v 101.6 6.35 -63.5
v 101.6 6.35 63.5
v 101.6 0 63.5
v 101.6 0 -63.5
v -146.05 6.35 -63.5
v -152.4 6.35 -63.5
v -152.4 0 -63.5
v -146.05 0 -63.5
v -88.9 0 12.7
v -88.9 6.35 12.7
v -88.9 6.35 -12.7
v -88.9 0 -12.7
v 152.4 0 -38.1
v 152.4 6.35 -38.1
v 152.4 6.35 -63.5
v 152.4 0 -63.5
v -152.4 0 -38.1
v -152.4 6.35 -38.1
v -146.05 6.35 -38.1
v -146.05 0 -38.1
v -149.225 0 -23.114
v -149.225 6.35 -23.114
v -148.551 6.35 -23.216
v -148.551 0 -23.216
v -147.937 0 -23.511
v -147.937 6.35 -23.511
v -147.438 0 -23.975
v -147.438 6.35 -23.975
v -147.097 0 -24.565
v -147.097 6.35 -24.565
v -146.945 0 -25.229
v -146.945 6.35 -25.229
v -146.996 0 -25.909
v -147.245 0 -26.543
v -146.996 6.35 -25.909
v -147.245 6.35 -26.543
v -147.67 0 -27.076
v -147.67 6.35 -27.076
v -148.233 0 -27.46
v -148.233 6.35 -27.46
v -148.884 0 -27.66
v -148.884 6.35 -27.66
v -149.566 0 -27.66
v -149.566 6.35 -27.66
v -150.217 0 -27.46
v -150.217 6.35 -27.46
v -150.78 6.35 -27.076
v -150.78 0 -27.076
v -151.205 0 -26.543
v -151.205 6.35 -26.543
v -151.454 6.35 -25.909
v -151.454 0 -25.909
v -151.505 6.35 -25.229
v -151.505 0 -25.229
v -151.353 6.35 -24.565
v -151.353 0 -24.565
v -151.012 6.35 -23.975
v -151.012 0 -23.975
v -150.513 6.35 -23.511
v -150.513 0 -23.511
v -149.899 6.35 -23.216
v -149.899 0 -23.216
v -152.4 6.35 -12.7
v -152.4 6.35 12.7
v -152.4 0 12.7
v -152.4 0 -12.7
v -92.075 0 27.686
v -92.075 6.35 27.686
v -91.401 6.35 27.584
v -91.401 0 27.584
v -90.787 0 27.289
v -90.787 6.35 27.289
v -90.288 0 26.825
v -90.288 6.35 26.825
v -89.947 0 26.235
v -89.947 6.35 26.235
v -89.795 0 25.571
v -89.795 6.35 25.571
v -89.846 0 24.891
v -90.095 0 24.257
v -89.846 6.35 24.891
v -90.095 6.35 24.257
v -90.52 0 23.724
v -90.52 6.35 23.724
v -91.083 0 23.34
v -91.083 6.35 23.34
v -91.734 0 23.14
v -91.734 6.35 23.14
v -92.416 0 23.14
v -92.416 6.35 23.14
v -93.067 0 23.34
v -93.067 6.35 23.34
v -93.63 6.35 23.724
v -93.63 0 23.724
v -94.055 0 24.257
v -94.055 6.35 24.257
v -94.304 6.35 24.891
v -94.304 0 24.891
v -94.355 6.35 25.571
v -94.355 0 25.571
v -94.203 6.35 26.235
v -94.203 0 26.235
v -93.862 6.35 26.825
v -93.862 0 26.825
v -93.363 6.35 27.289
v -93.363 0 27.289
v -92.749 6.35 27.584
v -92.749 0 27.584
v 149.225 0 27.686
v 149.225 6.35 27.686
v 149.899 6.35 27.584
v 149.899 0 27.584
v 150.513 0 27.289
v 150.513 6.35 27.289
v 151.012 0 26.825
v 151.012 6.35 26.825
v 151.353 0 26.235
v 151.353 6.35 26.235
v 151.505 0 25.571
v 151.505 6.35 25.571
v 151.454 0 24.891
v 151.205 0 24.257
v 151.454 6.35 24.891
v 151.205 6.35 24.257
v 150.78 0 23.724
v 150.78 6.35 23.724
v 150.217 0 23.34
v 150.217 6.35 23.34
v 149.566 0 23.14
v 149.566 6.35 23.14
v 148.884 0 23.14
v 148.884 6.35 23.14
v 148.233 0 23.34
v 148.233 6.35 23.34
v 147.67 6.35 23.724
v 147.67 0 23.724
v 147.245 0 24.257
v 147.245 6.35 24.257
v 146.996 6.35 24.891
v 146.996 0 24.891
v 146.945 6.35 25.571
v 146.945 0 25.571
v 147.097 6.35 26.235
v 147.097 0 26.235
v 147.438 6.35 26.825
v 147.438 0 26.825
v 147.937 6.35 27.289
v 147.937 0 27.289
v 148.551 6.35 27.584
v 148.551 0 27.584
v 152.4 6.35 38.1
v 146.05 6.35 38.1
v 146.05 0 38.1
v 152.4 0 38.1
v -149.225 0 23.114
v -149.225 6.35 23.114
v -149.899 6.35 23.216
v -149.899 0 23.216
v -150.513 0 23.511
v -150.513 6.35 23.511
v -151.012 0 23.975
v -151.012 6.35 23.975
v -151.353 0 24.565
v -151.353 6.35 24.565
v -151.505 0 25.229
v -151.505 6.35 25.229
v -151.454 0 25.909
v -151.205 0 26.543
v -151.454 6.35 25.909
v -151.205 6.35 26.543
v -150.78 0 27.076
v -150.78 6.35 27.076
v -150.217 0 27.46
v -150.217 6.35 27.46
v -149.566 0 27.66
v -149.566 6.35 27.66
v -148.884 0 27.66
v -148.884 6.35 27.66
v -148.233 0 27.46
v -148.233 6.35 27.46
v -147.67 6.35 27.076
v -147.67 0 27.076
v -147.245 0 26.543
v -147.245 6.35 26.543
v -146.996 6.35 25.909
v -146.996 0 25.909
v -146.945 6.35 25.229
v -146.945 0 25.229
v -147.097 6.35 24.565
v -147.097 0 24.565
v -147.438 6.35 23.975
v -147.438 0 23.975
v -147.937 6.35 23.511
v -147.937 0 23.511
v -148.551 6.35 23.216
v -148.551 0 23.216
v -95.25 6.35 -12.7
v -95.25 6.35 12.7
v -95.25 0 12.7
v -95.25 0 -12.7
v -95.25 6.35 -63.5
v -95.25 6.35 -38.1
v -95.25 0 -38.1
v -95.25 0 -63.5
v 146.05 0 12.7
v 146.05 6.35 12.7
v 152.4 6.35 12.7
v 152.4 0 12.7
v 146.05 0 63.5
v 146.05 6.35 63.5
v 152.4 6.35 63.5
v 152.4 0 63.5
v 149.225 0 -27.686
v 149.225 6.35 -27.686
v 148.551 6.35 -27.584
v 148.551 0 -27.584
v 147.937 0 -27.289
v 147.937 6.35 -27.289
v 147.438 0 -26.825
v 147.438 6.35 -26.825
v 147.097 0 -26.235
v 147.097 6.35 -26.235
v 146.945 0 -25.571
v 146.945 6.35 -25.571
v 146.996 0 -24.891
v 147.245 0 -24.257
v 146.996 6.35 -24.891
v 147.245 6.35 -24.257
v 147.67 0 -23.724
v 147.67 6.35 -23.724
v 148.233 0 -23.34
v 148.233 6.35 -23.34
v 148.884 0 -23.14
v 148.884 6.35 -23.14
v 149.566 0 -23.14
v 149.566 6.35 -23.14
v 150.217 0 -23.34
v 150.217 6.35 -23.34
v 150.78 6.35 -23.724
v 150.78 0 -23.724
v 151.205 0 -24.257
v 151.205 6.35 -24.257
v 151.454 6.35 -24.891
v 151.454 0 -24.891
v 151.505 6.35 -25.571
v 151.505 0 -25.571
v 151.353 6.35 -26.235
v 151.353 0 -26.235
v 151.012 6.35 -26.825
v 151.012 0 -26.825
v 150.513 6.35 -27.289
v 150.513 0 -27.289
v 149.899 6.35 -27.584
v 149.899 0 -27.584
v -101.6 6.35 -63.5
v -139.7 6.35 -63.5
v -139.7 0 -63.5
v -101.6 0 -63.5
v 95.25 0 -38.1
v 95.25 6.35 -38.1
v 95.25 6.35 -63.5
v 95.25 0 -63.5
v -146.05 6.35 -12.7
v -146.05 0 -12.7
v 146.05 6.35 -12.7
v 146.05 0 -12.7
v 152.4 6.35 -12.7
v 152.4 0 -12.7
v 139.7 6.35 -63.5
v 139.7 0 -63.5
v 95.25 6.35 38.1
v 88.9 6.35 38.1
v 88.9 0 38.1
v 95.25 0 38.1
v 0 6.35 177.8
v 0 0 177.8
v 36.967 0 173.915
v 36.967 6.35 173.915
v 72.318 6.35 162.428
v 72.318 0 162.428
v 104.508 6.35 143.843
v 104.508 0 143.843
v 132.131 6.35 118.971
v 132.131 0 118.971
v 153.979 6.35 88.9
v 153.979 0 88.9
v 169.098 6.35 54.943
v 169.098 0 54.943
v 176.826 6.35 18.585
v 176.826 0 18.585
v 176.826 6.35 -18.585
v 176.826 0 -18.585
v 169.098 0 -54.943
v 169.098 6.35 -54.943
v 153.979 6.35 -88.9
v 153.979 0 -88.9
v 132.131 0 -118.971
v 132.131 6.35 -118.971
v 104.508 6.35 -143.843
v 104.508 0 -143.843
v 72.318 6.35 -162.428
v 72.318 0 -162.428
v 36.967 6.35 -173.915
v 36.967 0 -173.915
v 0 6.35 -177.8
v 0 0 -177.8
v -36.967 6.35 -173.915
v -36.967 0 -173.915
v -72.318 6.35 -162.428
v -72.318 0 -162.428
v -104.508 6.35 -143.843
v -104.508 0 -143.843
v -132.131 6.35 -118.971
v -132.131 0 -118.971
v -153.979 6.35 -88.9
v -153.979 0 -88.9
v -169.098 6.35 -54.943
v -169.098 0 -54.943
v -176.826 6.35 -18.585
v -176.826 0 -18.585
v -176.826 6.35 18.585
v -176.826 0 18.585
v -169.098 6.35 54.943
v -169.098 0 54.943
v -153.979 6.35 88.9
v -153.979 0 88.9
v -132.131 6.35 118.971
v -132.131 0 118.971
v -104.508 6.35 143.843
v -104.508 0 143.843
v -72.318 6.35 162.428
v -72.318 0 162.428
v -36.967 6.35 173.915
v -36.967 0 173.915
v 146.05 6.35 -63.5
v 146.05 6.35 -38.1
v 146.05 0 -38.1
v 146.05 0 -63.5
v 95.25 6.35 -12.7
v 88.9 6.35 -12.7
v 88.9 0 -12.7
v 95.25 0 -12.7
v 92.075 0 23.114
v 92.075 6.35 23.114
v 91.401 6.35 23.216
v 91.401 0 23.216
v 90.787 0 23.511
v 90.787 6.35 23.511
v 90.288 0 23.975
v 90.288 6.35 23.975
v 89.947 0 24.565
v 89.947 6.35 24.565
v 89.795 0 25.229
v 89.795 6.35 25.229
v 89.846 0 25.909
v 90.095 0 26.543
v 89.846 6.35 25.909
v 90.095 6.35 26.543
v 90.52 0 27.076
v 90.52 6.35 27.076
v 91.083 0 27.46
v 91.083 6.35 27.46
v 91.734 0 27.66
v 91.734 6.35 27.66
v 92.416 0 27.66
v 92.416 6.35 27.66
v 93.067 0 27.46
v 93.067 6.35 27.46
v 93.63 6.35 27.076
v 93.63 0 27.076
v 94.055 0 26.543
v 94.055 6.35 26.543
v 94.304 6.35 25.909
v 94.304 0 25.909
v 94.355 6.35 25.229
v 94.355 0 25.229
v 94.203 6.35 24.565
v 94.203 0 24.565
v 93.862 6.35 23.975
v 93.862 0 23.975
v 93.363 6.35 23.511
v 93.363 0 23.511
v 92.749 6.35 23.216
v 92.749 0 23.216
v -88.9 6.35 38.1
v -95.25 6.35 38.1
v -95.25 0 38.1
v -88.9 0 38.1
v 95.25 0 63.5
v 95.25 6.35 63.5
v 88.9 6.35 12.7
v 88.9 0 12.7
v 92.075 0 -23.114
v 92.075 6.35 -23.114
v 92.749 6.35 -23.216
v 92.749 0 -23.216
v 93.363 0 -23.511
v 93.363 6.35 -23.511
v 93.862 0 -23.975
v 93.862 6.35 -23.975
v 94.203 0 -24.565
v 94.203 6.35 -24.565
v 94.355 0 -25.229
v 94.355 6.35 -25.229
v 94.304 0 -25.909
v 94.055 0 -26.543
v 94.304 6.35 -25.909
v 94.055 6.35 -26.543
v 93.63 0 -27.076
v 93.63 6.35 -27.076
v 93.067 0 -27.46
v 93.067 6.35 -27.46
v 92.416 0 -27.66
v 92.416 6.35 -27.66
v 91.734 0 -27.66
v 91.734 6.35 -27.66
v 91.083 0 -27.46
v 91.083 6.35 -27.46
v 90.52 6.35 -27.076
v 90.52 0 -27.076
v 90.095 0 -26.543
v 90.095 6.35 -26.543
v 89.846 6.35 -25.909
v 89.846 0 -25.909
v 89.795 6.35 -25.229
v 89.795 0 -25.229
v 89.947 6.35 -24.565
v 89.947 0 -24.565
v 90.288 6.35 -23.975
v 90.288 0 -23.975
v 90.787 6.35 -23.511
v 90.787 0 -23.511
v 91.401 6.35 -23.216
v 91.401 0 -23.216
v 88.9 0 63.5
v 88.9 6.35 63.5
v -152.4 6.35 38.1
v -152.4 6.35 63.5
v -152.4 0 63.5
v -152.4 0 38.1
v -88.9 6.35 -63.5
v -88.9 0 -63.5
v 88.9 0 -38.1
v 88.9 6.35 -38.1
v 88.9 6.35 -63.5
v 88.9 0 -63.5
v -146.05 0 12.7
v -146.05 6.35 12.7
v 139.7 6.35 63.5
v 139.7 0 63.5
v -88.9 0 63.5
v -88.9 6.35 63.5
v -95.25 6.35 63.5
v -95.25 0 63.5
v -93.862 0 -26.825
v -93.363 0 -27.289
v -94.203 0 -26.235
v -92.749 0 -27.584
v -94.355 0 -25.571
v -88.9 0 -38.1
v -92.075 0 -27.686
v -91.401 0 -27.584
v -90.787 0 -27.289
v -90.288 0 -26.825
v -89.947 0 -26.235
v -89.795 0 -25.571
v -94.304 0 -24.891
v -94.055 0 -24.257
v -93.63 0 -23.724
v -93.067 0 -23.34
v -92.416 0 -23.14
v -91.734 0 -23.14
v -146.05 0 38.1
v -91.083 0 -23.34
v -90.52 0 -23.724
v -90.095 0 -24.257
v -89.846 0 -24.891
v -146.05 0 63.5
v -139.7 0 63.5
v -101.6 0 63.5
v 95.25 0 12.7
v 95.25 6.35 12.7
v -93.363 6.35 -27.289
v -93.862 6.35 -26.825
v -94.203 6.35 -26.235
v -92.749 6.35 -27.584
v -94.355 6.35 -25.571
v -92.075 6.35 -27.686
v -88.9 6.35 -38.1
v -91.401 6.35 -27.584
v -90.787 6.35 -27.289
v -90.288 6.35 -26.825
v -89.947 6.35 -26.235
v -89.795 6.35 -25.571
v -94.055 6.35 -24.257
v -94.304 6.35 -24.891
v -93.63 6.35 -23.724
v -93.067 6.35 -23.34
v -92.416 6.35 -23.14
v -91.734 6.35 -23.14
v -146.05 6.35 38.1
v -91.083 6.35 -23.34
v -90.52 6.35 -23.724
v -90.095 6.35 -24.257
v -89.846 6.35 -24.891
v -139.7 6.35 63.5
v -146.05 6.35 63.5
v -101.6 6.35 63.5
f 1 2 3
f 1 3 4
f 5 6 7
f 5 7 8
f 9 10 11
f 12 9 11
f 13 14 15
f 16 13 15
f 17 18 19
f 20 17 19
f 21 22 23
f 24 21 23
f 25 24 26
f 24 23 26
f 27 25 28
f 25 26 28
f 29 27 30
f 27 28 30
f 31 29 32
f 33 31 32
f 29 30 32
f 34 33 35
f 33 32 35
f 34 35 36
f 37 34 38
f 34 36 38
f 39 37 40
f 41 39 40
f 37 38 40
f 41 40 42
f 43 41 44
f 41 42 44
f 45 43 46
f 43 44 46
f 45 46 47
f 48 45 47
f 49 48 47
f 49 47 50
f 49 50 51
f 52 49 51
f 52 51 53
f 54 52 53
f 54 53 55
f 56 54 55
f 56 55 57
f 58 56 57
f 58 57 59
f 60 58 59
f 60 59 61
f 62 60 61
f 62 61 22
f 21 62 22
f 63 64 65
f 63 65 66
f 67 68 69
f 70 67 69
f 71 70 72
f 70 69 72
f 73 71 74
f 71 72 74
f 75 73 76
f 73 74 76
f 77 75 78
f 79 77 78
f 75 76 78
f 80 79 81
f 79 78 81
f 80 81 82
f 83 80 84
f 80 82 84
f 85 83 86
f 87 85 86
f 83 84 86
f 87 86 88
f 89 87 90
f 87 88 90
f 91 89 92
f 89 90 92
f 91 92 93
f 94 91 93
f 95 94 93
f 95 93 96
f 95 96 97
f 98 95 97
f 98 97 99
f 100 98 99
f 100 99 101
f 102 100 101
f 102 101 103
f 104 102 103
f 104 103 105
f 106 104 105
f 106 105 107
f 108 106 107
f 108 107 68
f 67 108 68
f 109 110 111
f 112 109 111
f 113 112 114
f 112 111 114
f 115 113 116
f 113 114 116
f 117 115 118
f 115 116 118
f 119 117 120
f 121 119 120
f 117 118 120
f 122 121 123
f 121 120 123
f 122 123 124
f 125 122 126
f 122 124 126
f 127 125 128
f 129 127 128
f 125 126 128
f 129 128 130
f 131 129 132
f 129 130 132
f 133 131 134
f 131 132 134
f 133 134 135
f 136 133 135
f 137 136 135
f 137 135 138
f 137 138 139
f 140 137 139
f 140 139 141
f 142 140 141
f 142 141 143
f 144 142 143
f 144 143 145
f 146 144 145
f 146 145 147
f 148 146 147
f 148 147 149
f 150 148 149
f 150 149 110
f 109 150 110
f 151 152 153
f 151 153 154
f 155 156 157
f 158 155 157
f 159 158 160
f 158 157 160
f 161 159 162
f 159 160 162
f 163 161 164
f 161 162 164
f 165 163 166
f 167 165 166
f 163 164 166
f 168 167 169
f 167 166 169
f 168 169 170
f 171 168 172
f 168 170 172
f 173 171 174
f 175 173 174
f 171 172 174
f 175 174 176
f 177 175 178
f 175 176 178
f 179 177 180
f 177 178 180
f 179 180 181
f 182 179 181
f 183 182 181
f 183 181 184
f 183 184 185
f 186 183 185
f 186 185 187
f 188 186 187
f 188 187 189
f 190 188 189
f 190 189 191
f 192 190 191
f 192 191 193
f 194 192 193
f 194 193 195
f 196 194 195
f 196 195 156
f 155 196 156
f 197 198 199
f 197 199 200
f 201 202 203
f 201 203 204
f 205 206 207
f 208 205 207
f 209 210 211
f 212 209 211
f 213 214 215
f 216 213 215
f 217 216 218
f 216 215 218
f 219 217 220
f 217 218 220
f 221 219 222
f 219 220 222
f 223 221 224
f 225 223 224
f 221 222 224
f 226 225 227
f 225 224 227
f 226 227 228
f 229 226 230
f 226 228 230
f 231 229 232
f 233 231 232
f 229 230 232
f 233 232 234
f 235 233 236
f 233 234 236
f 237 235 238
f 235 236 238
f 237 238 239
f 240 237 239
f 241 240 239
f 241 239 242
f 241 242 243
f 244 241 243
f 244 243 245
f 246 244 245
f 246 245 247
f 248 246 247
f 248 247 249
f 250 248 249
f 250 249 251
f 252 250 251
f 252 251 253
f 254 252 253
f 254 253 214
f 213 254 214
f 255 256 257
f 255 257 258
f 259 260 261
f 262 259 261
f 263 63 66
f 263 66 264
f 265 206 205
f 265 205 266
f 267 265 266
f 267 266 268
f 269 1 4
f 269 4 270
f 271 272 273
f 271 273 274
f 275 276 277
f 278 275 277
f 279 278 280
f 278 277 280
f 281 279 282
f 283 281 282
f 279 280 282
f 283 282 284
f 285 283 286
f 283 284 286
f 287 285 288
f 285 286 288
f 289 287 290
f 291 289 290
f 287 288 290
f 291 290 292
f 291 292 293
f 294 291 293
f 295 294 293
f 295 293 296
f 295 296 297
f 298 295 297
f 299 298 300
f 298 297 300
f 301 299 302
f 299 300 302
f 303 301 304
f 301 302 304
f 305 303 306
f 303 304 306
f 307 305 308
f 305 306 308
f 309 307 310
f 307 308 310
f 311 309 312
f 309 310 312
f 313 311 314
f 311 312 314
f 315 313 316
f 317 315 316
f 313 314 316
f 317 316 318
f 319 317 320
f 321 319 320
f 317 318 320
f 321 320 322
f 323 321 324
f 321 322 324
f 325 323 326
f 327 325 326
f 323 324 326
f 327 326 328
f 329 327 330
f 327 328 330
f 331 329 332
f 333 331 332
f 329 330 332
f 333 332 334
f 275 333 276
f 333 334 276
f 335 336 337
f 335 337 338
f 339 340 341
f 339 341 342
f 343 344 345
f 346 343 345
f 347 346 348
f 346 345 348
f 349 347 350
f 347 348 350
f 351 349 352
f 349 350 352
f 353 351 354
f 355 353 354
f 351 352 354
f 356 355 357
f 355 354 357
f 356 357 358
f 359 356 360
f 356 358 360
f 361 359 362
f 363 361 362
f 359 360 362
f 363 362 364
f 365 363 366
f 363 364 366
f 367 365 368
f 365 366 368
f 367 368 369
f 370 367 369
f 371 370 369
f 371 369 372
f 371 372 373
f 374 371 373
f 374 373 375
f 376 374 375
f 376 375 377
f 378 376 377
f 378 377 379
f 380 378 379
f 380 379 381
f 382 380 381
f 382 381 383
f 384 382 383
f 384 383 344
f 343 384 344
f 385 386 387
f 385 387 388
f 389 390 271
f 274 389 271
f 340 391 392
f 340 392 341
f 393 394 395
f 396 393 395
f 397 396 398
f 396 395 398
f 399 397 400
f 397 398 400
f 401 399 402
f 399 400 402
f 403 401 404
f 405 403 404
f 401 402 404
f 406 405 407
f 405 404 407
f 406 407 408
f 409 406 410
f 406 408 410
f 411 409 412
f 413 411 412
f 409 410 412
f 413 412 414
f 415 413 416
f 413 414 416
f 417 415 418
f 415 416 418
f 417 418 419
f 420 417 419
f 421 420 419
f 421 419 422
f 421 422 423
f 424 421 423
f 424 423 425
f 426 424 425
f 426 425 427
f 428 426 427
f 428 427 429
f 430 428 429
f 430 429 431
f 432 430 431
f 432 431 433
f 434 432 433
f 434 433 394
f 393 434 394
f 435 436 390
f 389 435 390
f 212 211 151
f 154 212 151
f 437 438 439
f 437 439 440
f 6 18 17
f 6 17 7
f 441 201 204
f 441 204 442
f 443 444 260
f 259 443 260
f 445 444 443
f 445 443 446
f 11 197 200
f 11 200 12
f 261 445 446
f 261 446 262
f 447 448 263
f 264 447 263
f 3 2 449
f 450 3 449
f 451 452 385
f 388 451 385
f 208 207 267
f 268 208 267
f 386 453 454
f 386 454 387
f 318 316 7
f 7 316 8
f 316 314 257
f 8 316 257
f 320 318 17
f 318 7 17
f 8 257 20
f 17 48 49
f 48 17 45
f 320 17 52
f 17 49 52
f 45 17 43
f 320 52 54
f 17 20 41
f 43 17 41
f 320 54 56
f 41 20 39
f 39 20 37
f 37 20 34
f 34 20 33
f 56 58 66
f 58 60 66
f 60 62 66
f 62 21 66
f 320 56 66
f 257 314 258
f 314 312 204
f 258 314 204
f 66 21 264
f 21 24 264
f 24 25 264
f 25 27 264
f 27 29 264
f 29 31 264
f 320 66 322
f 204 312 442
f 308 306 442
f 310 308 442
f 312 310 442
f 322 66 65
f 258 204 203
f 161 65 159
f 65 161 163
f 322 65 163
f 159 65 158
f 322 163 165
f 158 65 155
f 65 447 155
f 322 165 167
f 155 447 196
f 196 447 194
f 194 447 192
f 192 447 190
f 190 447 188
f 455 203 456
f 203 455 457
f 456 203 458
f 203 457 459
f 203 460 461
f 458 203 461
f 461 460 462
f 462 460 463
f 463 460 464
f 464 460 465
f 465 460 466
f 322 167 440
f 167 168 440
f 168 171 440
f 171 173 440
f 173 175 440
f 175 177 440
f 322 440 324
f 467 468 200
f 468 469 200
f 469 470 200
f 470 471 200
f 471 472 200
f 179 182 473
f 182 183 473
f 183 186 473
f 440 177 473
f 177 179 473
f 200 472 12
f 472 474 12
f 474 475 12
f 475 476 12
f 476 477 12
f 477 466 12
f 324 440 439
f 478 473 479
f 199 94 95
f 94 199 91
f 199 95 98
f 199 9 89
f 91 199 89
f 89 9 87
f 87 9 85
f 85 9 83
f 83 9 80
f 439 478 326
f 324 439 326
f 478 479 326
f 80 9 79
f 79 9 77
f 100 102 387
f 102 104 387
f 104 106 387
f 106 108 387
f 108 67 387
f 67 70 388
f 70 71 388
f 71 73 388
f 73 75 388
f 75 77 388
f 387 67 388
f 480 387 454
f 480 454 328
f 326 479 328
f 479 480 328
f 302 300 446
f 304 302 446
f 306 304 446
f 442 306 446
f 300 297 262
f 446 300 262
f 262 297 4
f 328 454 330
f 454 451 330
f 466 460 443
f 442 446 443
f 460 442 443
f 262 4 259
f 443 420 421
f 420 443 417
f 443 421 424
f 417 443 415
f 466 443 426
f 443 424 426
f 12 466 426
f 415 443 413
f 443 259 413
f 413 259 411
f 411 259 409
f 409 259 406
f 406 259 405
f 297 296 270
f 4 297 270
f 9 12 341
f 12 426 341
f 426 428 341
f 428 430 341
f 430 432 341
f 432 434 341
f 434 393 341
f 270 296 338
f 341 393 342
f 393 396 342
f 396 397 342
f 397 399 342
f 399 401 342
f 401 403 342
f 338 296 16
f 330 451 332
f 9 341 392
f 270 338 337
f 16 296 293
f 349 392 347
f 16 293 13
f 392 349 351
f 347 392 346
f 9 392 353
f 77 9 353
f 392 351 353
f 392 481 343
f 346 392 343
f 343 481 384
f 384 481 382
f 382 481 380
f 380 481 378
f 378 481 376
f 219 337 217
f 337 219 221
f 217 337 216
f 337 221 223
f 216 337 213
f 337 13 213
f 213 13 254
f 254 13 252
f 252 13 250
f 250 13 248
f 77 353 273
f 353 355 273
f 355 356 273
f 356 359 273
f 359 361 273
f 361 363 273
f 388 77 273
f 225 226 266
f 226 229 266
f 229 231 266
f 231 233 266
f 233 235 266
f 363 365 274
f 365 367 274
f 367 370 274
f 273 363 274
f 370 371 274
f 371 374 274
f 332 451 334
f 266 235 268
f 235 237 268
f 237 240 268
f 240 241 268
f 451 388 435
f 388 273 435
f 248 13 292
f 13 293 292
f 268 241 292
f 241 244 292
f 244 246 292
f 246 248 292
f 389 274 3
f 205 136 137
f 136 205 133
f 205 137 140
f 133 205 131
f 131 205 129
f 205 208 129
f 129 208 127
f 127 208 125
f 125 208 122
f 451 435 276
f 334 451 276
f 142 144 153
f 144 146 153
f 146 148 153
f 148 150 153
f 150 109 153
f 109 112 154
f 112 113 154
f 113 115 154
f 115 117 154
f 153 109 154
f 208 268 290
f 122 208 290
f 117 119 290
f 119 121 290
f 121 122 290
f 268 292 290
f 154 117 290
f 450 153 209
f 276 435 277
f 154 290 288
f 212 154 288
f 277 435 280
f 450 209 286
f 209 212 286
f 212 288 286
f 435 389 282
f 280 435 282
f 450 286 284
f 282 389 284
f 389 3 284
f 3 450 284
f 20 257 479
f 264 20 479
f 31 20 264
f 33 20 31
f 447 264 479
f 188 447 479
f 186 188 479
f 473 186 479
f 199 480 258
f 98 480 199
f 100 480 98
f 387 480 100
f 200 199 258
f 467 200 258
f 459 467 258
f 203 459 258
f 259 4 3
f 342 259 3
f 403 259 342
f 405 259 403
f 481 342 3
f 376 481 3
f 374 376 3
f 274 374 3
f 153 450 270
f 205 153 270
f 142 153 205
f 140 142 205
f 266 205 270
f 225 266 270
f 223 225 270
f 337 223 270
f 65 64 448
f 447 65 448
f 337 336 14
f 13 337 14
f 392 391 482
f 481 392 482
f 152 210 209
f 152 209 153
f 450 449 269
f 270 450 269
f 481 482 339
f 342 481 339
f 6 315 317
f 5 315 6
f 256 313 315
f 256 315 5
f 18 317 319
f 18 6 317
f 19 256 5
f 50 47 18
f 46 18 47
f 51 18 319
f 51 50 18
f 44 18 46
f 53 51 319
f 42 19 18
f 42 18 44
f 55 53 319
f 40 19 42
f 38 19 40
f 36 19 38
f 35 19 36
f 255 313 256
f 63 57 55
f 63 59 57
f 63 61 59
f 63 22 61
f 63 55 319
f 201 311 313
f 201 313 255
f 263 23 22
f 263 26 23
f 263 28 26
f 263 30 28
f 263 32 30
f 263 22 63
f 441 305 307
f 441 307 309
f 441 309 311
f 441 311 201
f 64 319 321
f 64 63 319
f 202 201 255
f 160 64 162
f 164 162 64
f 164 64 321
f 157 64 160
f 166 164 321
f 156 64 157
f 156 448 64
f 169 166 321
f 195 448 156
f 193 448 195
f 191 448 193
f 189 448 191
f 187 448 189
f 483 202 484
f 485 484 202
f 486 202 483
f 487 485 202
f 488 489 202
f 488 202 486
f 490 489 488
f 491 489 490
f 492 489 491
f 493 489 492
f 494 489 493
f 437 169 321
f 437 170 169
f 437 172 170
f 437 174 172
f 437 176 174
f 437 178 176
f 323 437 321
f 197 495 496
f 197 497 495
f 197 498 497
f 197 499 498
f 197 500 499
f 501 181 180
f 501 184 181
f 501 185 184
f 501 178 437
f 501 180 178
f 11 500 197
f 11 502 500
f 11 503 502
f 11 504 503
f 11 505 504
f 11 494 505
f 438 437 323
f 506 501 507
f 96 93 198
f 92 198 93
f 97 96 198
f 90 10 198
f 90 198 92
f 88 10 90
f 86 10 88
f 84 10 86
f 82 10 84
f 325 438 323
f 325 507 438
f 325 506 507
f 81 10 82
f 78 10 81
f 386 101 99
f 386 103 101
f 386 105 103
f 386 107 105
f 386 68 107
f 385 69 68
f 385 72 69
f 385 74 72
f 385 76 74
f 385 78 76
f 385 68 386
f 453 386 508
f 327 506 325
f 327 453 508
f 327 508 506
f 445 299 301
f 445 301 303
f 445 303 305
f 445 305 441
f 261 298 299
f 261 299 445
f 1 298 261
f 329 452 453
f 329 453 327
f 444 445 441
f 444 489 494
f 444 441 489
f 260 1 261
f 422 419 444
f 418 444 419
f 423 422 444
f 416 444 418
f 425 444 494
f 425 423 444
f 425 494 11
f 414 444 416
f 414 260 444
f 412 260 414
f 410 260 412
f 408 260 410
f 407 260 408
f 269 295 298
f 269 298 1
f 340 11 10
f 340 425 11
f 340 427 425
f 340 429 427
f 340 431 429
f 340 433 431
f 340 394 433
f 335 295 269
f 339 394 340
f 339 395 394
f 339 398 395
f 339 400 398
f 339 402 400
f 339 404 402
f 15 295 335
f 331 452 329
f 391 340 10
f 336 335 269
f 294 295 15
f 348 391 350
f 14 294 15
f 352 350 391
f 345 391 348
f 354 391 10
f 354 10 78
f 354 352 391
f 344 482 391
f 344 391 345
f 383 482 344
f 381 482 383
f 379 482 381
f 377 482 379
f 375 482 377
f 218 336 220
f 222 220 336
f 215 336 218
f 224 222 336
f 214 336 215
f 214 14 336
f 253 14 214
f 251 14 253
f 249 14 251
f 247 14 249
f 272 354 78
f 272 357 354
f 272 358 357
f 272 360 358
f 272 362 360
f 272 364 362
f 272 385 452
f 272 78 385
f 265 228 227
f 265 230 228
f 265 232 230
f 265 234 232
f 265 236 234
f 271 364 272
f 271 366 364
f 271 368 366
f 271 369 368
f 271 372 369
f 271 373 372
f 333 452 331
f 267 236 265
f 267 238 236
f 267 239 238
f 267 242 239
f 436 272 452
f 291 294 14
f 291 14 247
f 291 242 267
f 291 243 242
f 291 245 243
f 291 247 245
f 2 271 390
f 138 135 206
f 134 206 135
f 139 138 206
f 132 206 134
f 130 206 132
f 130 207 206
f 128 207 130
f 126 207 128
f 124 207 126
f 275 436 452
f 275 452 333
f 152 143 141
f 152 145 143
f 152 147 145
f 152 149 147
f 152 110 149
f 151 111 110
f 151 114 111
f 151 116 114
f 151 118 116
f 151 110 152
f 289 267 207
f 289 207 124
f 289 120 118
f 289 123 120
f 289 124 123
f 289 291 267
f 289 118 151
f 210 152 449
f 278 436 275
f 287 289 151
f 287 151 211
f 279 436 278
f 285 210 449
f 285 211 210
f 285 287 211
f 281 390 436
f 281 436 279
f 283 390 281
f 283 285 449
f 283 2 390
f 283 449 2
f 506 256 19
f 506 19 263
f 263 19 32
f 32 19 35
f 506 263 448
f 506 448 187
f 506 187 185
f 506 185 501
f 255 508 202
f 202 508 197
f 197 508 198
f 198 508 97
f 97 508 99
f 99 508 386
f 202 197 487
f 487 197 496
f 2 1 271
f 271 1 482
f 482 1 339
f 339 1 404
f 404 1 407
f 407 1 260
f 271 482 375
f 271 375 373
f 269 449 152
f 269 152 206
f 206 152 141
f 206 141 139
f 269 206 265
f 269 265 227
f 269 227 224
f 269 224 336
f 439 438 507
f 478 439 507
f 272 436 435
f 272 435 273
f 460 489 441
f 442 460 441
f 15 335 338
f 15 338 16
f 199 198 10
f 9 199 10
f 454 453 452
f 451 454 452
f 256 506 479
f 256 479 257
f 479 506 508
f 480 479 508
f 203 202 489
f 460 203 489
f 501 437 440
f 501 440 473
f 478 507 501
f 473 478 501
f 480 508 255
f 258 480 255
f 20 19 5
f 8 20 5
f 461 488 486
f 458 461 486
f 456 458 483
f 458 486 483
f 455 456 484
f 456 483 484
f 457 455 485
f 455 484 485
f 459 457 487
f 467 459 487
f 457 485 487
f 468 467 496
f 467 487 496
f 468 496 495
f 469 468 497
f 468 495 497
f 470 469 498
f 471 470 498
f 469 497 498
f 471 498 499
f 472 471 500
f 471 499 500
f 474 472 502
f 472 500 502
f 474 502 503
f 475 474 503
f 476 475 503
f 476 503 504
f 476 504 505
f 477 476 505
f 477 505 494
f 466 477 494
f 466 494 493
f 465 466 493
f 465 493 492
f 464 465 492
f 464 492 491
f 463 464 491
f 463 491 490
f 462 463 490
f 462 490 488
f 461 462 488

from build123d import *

# Parameters (mm, degrees)
SKETCH1_R           = 177.8
BOSS_EXTRUDE1_DEPTH = 6.35
SKETCH2_R           = 2.286
SKETCH2_W           = 38.1
SKETCH2_H           = 127
SKETCH2_W_2         = 6.35
SKETCH2_H_2         = 25.4
CUT_EXTRUDE1_DEPTH  = 252.527339468


with BuildPart() as part:
    # Sketch1 → Boss-Extrude1 (new body)
    with BuildSketch(Plane(origin=(0, 0, 0), x_dir=(1, 0, 0), z_dir=(0, 1, 0))):
        with Locations(Location((0, 0, 0), (0, 0, 270))):
            Circle(SKETCH1_R)
    extrude(amount=BOSS_EXTRUDE1_DEPTH)

    # Sketch2 → Cut-Extrude1 (cut, through all)
    with BuildSketch(Plane(origin=(0, 6.35, 0), x_dir=(1, 0, 0), z_dir=(0, 1, 0))):
        with Locations(Location((-149.225, 25.4, 0), (0, 0, 270))):
            Circle(SKETCH2_R)
        with Locations(Location((-149.225, -25.4, 0), (0, 0, 90))):
            Circle(SKETCH2_R)
        with Locations(Location((-92.075, -25.4, 0), (0, 0, 270))):
            Circle(SKETCH2_R)
        with Locations(Location((-92.075, 25.4, 0), (0, 0, 90))):
            Circle(SKETCH2_R)
        with Locations(Location((92.075, 25.4, 0), (0, 0, 270))):
            Circle(SKETCH2_R)
        with Locations(Location((92.075, -25.4, 0), (0, 0, 90))):
            Circle(SKETCH2_R)
        with Locations(Location((149.225, -25.4, 0), (0, 0, 270))):
            Circle(SKETCH2_R)
        with Locations(Location((149.225, 25.4, 0), (0, 0, 90))):
            Circle(SKETCH2_R)
        with Locations((-120.65, 0)):
            Rectangle(SKETCH2_W, SKETCH2_H)
        with Locations((-149.225, 50.8)):
            Rectangle(SKETCH2_W_2, SKETCH2_H_2)
        with Locations((-149.225, 0)):
            Rectangle(SKETCH2_W_2, SKETCH2_H_2)
        with Locations((-149.225, -50.8)):
            Rectangle(SKETCH2_W_2, SKETCH2_H_2)
        with Locations((-92.075, -50.8)):
            Rectangle(SKETCH2_W_2, SKETCH2_H_2)
        with Locations((-92.075, 0)):
            Rectangle(SKETCH2_W_2, SKETCH2_H_2)
        with Locations((-92.075, 50.8)):
            Rectangle(SKETCH2_W_2, SKETCH2_H_2)
        with Locations((92.075, 50.8)):
            Rectangle(SKETCH2_W_2, SKETCH2_H_2)
        with Locations((92.075, 0)):
            Rectangle(SKETCH2_W_2, SKETCH2_H_2)
        with Locations((92.075, -50.8)):
            Rectangle(SKETCH2_W_2, SKETCH2_H_2)
        with Locations((149.225, -50.8)):
            Rectangle(SKETCH2_W_2, SKETCH2_H_2)
        with Locations((149.225, 0)):
            Rectangle(SKETCH2_W_2, SKETCH2_H_2)
        with Locations((149.225, 50.8)):
            Rectangle(SKETCH2_W_2, SKETCH2_H_2)
        with Locations((120.65, 0)):
            Rectangle(SKETCH2_W, SKETCH2_H)
    extrude(amount=-CUT_EXTRUDE1_DEPTH, mode=Mode.SUBTRACT)


solid = part.part
